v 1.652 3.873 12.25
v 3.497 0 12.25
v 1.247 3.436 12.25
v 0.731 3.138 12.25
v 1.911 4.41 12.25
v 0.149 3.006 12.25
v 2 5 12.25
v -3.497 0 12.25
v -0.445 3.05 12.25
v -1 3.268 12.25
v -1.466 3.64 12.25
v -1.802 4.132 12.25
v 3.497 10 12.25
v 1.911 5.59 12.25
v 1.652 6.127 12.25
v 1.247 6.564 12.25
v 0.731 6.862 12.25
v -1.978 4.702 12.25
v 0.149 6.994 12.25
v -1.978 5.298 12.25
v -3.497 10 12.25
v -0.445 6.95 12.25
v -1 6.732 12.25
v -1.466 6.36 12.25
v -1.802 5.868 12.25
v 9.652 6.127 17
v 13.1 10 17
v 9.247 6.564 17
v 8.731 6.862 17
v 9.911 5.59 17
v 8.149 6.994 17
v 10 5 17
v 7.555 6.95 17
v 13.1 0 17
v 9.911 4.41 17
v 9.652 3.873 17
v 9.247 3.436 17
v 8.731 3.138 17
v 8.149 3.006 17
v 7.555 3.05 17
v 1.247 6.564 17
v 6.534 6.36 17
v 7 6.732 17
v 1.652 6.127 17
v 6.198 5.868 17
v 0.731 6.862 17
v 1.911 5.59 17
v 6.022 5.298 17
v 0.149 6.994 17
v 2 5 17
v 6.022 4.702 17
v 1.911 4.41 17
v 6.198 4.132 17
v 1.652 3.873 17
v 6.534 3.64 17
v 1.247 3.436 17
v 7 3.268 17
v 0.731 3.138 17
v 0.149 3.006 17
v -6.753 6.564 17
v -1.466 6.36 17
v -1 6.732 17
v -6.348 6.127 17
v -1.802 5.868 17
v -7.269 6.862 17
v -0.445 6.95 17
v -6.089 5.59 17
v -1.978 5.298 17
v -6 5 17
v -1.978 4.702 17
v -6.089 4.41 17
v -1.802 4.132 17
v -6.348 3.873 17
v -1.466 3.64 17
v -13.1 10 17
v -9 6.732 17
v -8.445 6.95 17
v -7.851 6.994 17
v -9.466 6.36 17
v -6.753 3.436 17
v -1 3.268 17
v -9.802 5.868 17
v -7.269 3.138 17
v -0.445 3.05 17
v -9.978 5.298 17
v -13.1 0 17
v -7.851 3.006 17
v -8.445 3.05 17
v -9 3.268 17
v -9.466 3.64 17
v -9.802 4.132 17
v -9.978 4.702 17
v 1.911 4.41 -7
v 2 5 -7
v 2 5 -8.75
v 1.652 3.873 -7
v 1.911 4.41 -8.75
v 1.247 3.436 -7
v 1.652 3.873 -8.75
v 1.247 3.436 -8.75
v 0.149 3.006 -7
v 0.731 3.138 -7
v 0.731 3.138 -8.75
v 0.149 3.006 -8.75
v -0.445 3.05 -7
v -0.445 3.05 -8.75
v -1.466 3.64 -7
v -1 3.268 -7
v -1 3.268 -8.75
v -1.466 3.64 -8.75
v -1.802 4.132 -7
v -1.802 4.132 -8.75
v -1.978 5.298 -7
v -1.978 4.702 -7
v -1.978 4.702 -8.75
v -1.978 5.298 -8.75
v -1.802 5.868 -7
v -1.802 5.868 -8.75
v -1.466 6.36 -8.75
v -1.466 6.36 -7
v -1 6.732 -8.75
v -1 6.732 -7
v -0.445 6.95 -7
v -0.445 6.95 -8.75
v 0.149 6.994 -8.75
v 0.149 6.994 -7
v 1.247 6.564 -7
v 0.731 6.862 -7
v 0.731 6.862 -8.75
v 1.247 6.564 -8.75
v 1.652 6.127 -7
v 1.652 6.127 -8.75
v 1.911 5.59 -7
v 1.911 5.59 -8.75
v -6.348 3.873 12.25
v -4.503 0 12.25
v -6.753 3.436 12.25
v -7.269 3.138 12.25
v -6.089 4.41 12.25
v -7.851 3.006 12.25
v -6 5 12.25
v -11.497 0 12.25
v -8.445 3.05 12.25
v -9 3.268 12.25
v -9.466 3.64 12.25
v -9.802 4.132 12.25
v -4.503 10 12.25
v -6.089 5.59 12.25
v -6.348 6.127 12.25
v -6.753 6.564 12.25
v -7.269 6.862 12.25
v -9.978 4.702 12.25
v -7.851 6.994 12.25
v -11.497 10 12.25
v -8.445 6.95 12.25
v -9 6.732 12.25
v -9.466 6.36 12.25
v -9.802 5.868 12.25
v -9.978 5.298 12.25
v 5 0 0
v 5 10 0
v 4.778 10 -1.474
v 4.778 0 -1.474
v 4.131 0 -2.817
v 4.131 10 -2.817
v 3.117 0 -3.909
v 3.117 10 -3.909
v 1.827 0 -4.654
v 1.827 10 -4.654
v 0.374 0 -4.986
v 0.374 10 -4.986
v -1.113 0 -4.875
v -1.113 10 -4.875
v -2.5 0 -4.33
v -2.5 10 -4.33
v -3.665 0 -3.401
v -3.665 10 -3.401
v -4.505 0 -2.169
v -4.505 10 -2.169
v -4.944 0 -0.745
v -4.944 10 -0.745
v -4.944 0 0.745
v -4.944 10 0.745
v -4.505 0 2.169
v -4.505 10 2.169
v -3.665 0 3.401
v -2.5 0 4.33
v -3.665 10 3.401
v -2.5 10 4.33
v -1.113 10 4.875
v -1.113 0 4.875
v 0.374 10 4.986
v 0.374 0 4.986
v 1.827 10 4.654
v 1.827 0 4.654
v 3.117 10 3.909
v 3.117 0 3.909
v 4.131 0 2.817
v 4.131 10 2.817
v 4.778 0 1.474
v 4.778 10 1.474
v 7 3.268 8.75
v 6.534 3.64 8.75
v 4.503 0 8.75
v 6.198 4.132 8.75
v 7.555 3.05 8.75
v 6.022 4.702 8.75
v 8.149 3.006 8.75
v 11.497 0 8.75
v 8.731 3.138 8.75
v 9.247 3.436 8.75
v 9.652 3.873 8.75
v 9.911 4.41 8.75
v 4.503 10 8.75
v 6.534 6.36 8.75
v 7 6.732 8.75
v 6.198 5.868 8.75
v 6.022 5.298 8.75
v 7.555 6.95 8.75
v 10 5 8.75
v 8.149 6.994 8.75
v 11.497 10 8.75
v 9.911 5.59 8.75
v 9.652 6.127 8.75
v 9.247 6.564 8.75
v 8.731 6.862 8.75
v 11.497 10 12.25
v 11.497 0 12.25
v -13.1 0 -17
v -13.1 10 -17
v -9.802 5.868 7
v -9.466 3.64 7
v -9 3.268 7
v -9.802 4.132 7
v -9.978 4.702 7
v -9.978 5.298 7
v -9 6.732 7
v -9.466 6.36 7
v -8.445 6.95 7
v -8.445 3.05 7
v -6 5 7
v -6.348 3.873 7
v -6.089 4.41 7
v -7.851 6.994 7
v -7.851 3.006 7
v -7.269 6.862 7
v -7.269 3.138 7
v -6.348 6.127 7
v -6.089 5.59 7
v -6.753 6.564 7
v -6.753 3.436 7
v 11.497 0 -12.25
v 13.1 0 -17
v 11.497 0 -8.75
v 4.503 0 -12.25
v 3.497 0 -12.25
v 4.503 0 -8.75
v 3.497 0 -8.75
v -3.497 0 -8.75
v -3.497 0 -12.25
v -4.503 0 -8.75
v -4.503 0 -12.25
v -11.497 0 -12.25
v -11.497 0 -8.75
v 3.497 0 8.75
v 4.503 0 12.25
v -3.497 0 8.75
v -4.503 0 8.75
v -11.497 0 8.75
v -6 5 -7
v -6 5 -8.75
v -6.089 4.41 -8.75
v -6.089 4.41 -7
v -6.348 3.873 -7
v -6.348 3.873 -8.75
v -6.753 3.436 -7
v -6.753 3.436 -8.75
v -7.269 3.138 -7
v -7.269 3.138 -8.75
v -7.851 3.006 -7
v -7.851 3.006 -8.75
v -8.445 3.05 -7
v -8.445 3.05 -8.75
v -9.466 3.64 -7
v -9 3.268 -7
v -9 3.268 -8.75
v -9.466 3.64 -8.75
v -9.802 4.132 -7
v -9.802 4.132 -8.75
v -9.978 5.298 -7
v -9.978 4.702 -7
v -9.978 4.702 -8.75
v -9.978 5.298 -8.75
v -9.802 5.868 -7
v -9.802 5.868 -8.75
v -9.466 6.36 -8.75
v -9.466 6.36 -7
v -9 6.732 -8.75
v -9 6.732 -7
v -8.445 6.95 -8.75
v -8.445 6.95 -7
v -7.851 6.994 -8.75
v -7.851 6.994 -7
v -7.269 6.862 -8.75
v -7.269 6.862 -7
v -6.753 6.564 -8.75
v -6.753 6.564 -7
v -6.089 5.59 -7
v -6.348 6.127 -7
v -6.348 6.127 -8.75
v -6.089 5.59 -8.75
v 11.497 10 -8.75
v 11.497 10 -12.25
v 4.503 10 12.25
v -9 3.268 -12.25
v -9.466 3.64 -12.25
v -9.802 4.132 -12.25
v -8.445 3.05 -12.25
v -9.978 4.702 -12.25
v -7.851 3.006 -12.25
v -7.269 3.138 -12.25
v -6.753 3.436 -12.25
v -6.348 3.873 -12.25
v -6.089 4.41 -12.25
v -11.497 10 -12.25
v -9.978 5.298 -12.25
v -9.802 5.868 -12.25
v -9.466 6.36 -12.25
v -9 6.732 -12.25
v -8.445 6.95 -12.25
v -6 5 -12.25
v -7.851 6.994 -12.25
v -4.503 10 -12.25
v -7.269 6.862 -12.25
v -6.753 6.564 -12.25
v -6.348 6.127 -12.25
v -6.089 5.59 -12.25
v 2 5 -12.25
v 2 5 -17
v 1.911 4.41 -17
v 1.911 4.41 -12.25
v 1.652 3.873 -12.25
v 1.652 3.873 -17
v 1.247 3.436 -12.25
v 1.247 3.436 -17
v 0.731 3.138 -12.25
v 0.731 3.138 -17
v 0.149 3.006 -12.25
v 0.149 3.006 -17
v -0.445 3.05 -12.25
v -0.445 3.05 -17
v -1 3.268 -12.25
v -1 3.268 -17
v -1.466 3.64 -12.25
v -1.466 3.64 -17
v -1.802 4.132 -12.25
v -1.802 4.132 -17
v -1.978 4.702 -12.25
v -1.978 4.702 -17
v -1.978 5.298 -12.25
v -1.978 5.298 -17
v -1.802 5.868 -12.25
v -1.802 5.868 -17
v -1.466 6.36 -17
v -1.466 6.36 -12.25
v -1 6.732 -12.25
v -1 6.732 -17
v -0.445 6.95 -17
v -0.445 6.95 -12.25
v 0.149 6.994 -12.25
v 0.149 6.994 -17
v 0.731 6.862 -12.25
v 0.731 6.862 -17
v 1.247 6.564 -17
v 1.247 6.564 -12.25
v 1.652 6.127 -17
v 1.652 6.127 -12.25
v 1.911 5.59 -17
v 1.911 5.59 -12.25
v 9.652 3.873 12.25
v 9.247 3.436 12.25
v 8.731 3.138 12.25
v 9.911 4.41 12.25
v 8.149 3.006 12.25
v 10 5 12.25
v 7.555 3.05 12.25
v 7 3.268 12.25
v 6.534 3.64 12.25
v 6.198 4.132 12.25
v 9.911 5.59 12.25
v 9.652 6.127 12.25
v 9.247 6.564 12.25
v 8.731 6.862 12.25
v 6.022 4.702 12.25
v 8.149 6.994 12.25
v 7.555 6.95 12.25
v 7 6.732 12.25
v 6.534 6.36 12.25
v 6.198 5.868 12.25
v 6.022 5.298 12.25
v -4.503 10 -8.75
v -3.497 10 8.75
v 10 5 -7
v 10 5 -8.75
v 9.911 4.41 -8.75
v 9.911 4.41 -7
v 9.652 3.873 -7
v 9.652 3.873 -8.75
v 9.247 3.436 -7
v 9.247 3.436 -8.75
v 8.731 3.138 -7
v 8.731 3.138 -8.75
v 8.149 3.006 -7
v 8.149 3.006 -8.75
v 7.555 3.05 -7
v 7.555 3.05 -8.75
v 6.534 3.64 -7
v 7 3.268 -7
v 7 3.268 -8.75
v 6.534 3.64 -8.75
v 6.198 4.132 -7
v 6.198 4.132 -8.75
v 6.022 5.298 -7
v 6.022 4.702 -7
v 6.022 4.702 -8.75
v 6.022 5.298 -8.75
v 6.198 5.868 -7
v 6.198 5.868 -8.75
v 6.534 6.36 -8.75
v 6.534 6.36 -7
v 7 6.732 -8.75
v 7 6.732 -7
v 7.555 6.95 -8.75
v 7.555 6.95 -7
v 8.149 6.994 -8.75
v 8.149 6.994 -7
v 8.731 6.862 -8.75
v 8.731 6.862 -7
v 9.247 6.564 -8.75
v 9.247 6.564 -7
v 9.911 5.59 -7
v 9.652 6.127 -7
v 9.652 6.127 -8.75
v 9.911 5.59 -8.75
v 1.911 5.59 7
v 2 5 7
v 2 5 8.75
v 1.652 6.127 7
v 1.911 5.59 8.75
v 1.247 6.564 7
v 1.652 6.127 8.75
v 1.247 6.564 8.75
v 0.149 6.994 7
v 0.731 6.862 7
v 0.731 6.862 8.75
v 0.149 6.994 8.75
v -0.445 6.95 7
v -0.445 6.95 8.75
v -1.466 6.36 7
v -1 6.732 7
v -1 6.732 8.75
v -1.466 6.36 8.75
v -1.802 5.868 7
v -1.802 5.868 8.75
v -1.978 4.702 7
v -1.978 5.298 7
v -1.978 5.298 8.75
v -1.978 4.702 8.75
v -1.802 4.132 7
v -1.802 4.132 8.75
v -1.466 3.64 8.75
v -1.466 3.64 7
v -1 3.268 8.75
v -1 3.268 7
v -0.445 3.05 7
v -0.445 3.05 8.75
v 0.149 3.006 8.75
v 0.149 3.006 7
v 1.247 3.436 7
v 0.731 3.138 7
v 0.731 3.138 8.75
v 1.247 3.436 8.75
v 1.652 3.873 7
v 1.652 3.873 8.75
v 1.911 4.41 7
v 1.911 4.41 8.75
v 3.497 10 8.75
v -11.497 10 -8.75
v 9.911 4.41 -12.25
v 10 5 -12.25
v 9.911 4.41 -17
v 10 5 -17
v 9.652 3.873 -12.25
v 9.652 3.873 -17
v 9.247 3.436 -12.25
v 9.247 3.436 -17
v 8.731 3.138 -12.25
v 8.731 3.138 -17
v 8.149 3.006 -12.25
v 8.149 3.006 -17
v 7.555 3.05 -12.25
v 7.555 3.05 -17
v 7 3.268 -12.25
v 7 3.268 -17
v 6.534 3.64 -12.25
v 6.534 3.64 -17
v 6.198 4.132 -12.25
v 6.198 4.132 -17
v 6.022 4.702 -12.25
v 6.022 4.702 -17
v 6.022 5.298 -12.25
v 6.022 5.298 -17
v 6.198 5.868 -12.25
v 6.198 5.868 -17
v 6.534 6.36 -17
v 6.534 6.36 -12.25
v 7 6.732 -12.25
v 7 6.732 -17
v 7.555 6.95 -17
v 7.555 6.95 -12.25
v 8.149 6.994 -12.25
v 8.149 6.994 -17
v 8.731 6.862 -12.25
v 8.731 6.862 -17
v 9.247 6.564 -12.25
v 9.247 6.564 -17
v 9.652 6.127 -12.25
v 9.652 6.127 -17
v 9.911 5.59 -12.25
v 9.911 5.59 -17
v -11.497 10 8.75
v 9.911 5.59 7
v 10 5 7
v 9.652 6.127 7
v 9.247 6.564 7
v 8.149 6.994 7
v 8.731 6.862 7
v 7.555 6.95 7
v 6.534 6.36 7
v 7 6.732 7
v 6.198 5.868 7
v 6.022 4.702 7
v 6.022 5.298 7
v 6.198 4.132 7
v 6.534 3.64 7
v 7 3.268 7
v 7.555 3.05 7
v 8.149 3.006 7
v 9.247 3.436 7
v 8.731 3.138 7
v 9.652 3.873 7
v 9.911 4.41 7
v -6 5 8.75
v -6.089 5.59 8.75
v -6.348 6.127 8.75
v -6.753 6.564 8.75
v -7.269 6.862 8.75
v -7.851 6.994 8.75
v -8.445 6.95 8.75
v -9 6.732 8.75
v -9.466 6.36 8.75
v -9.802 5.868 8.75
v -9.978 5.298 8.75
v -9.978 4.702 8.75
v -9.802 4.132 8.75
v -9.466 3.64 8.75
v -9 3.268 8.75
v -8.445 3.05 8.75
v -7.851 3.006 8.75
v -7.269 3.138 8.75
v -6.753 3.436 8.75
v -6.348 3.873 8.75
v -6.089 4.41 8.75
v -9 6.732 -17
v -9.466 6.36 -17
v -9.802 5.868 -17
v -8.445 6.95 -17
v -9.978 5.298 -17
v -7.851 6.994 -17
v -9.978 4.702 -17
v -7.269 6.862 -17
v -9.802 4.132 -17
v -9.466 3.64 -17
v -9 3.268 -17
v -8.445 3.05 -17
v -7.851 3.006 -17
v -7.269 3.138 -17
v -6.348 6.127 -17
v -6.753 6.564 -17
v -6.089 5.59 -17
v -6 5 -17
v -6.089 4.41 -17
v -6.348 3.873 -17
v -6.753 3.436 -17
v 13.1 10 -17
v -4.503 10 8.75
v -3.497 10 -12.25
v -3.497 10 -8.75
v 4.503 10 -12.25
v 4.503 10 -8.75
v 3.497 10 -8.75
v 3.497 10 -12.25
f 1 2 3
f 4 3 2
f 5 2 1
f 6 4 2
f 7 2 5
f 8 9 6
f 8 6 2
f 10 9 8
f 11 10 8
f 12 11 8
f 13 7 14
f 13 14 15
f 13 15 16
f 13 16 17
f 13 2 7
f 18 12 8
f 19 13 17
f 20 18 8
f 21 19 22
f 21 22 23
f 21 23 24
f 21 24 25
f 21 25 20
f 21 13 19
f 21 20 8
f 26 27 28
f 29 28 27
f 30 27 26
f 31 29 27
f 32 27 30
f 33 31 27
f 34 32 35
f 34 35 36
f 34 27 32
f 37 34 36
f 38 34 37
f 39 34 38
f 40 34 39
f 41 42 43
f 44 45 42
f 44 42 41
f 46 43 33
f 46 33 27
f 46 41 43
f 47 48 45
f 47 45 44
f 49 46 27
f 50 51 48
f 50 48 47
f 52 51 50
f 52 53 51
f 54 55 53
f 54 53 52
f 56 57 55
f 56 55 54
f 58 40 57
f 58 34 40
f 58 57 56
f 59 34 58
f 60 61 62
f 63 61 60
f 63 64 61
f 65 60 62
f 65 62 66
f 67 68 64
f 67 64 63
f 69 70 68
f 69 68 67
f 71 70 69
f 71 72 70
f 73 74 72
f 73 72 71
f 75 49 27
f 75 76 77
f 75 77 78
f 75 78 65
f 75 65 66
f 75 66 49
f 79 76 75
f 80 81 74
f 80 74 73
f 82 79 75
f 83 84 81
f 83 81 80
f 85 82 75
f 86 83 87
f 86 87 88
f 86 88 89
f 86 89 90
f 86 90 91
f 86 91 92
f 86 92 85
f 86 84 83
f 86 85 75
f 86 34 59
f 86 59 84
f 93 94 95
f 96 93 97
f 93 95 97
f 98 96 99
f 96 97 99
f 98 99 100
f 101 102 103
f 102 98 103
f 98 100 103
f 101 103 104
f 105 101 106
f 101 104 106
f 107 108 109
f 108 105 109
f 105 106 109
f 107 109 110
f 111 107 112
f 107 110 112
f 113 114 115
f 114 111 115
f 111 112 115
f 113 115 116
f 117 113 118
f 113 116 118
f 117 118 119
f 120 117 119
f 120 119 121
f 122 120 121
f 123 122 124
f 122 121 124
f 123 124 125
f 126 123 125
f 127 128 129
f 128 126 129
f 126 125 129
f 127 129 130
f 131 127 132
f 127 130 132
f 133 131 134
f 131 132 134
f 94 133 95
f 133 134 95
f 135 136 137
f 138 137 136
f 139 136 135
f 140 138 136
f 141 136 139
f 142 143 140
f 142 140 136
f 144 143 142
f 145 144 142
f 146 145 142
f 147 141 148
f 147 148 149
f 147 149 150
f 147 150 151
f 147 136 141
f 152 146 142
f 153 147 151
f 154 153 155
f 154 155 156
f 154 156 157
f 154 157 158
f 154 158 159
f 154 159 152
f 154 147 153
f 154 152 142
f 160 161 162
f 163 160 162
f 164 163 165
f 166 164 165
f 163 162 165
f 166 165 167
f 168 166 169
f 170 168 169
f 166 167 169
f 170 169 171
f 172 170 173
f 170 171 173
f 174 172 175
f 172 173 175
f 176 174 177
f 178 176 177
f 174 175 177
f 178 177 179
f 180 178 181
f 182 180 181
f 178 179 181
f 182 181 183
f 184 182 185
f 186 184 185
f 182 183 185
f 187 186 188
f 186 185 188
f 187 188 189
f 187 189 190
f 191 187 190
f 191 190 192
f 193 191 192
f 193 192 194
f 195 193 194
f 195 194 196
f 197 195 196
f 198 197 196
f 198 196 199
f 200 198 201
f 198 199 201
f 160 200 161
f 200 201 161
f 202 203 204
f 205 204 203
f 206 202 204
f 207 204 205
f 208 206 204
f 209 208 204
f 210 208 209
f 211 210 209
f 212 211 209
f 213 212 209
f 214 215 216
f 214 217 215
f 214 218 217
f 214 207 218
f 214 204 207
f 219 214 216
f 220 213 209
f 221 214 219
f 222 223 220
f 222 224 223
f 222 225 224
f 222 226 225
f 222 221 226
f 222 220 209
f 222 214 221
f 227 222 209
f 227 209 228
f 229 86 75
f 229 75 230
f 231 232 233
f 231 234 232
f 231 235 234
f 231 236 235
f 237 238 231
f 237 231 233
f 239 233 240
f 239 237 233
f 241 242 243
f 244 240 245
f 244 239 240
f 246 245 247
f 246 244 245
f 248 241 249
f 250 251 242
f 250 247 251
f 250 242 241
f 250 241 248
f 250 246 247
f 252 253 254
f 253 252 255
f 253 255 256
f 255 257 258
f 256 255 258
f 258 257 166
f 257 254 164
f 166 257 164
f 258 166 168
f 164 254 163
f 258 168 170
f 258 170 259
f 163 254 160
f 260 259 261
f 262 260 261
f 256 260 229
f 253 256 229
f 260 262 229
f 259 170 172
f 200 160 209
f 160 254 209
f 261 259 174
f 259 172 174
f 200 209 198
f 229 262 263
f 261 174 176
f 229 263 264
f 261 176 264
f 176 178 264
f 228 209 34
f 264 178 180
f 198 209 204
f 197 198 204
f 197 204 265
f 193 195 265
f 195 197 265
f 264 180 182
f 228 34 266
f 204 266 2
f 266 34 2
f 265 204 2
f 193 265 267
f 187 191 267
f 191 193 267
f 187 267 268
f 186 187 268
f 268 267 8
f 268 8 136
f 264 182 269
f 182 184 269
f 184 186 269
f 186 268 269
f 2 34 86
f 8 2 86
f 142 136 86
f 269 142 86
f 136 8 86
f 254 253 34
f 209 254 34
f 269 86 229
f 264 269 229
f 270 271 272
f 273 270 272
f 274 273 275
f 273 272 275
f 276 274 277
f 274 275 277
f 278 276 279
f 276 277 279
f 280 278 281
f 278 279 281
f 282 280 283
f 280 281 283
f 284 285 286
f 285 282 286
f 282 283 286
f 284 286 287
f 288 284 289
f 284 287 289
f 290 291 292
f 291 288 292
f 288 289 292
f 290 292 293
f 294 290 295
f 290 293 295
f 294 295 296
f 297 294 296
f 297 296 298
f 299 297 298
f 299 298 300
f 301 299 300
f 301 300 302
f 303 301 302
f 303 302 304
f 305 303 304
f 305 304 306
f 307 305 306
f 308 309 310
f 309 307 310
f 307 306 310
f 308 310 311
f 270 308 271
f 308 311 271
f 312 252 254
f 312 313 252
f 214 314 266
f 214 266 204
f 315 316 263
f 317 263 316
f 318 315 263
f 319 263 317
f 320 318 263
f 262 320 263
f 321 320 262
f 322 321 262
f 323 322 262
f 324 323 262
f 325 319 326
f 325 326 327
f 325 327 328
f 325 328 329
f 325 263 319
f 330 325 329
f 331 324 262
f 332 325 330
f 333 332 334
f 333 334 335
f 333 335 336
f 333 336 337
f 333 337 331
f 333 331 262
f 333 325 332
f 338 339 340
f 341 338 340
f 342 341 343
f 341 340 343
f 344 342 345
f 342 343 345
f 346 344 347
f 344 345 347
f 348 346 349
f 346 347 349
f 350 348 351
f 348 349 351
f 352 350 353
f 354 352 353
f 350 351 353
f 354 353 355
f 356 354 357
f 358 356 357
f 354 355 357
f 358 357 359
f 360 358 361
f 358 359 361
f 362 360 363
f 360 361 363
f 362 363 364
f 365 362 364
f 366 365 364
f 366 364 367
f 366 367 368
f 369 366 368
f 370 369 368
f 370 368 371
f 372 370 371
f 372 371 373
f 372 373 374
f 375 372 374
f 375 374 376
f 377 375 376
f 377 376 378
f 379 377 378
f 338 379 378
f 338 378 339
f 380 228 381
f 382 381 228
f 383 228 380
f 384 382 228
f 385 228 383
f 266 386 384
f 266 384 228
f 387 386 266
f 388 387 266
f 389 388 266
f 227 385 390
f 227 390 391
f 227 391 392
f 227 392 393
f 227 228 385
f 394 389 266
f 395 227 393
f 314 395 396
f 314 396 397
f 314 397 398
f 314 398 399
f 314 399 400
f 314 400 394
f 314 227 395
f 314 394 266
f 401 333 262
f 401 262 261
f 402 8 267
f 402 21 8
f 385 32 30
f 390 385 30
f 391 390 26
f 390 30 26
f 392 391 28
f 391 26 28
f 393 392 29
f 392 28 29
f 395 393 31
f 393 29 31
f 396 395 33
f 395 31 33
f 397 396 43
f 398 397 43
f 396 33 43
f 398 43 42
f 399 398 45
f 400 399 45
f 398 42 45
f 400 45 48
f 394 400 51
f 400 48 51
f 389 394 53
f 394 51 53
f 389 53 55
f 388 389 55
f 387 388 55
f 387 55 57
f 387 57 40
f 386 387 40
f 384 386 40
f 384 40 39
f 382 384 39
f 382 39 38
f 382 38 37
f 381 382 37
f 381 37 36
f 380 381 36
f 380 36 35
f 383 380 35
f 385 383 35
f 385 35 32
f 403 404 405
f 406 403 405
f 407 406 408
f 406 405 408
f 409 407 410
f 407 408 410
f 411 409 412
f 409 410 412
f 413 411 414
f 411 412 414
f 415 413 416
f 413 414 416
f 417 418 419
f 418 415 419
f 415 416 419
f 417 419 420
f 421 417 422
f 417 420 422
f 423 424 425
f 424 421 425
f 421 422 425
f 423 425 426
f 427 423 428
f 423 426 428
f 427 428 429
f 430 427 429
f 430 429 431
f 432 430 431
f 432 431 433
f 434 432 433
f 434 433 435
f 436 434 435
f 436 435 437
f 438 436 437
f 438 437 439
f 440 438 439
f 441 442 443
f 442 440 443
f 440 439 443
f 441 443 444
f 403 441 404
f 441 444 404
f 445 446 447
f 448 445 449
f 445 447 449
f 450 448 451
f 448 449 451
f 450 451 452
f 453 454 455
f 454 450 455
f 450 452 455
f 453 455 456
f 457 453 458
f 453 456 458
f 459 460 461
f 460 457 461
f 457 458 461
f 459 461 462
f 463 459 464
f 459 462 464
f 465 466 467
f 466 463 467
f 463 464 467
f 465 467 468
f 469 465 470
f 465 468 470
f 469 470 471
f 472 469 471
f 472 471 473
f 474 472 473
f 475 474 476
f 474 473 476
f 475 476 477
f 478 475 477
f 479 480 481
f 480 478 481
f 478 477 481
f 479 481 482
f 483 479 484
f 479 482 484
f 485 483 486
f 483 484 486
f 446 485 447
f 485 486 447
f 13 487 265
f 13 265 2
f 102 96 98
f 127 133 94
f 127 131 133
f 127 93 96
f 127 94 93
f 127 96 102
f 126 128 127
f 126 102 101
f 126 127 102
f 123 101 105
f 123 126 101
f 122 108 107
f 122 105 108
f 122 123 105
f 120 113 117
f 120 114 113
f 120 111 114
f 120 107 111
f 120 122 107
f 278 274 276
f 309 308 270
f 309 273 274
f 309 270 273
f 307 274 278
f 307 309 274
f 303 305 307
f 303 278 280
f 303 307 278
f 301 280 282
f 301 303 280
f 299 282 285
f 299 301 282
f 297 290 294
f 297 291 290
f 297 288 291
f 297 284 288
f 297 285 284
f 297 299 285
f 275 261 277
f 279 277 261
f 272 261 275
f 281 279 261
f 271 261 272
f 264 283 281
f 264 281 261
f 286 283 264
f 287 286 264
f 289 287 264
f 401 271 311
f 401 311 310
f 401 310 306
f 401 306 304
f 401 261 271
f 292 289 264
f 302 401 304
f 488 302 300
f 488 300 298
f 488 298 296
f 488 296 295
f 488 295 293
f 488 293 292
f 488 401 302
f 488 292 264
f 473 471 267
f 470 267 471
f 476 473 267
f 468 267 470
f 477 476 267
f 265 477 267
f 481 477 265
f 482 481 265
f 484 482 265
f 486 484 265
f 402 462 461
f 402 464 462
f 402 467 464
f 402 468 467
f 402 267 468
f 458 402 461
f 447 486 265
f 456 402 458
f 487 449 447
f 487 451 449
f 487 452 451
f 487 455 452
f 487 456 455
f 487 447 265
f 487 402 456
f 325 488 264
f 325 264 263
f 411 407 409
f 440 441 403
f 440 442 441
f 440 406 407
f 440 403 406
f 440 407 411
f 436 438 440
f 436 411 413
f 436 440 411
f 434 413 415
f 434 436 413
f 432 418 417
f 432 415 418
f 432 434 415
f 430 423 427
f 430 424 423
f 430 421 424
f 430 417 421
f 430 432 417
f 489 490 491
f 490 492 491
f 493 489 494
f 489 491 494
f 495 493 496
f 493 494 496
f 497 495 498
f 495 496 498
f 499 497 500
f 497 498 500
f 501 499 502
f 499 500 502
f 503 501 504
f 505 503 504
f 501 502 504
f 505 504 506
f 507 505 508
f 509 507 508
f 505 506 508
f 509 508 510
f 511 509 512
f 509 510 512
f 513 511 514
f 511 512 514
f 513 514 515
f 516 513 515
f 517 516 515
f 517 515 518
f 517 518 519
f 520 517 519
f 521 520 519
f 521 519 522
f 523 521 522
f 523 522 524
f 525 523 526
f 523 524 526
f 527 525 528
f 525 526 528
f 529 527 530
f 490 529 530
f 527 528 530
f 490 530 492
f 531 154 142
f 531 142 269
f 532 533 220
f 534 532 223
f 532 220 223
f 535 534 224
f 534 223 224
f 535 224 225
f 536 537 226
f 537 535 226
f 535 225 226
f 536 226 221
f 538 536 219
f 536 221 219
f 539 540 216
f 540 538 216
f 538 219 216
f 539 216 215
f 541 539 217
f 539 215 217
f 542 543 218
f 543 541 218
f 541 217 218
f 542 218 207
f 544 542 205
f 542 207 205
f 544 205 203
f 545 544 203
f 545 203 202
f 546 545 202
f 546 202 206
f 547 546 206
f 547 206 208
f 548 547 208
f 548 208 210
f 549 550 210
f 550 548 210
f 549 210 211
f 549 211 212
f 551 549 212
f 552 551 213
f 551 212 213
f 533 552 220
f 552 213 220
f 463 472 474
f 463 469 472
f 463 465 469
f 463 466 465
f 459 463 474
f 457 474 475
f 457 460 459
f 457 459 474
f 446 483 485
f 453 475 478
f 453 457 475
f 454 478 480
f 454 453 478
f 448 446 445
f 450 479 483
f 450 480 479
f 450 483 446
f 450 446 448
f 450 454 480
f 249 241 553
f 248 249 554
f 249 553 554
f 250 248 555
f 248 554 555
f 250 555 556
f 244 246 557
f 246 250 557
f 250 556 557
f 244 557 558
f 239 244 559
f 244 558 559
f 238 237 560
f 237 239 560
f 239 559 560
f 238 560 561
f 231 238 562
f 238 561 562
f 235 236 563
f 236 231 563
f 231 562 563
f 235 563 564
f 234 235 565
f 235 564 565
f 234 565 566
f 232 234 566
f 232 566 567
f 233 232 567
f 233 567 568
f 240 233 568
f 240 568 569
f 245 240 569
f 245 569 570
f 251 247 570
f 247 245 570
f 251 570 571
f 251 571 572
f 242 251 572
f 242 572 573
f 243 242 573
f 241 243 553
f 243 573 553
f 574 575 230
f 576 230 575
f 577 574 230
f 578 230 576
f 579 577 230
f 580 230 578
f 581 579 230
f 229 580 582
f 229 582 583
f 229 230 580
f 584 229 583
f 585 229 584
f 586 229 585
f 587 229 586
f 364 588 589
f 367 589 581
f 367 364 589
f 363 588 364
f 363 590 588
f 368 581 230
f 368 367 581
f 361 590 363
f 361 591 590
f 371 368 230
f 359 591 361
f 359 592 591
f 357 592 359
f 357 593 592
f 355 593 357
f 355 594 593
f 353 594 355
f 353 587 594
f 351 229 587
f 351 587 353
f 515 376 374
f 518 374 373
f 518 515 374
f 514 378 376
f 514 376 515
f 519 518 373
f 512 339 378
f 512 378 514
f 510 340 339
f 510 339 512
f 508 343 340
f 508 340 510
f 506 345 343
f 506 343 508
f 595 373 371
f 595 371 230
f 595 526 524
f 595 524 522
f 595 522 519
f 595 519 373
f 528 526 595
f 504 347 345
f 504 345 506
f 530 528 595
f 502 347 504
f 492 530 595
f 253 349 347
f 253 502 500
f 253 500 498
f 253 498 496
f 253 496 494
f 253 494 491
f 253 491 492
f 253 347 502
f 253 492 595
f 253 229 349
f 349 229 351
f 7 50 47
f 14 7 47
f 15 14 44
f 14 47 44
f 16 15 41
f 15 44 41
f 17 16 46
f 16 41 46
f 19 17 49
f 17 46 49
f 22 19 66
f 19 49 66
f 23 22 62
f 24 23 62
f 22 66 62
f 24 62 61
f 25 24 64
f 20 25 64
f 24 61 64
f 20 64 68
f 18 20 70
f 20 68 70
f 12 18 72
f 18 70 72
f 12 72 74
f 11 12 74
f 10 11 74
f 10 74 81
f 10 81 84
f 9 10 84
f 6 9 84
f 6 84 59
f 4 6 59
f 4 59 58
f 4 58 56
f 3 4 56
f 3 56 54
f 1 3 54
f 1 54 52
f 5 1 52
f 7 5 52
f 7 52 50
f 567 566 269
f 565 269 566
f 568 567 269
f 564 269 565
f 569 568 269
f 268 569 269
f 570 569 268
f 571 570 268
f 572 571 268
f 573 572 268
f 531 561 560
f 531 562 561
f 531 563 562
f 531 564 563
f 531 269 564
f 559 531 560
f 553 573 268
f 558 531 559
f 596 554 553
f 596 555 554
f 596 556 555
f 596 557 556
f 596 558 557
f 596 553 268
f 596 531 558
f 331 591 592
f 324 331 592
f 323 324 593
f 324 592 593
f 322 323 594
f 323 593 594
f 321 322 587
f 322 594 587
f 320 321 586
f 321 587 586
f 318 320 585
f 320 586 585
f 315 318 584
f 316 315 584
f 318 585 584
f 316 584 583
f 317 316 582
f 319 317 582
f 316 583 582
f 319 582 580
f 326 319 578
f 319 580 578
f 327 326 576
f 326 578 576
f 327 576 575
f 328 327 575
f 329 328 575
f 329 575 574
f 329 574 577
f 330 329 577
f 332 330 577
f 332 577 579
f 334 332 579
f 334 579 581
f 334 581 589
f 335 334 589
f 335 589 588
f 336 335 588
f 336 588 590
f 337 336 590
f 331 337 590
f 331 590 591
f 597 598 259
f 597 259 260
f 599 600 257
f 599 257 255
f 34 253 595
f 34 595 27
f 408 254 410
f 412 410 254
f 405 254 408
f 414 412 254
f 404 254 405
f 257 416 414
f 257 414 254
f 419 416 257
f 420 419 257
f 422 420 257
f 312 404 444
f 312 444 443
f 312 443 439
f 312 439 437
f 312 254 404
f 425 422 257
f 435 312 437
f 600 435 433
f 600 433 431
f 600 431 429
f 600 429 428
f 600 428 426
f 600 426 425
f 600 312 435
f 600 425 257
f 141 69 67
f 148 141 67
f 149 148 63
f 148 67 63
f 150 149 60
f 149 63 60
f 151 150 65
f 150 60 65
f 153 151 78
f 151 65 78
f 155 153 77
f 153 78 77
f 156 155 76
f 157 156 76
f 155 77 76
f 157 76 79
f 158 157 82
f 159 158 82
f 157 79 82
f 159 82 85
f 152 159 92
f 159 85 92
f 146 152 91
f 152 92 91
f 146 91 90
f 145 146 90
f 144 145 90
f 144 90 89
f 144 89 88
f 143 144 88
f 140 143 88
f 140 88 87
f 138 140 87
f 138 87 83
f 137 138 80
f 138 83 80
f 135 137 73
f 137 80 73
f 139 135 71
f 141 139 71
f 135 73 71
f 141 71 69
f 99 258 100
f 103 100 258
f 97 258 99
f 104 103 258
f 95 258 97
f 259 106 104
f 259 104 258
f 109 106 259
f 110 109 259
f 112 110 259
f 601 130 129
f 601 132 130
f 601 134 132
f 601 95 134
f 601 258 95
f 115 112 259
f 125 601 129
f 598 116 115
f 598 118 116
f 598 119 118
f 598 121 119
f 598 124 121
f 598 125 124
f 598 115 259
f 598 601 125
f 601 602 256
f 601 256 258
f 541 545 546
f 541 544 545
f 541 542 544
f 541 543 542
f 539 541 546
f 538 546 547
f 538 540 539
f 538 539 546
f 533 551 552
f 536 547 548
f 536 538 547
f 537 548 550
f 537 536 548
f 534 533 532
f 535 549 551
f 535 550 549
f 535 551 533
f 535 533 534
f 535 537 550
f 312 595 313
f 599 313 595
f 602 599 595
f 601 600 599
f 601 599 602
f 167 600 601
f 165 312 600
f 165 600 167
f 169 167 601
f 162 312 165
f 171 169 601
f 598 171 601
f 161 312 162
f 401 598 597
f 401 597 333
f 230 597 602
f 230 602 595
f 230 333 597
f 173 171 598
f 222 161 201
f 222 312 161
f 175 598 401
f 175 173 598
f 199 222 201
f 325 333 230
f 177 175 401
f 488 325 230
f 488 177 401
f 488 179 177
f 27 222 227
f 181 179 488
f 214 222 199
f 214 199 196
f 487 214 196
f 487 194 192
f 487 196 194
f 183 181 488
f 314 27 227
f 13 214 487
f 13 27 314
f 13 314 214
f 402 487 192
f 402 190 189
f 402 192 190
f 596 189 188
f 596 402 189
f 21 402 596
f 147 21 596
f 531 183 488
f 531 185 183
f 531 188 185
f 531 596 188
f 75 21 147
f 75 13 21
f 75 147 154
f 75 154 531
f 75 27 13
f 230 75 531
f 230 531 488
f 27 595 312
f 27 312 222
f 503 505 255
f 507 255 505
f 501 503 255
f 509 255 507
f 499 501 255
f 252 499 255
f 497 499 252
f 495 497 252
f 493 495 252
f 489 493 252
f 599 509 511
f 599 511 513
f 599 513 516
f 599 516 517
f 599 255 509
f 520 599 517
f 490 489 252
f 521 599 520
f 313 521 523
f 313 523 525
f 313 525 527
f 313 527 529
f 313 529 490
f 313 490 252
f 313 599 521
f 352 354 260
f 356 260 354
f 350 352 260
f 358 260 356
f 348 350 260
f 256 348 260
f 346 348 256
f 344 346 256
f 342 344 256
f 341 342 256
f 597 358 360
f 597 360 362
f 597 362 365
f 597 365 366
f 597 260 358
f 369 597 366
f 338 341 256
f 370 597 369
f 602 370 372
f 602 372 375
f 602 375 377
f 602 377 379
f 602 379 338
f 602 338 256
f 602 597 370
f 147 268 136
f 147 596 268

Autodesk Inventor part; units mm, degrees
ref_plane "YZ Plane" through (0, 0, 0) normal (1, 0, 0) x (0, 1, 0)
ref_plane "XZ Plane" through (0, 0, 0) normal (0, 1, 0) x (-1, 0, 0)
ref_plane "XY Plane" through (0, 0, 0) normal (0, 0, 1) x (1, 0, 0)
sketch "Эскиз1" plane through (0, 0, 0) normal (0, 1, 0) x (-1, 0, 0)
  line L0 (-13.1, 17) -> (13.1, 17)
  line L1 (13.1, 17) -> (13.1, -17)
  line L2 (13.1, -17) -> (-13.1, -17)
  line L3 (-13.1, -17) -> (-13.1, 17)
  line L4 (-13.1, 17) -> (13.1, -17) construction
  line L5 (13.1, 17) -> (-13.1, -17) construction
  point P0 (0, 0)
  dimension "d0" = 26.2
  dimension "d1" = 34
extrude "Выдавливание1" add sketch "Эскиз1" along normal blind 10
sketch "Эскиз2" plane through (-13.1, 0, 17) normal (0, 0, 1) x (1, 0, 0)
  line L0 (0, 10) -> (26.2, 10) projected
  line L1 (13.1, 10) -> (13.1, 5)
  circle A0 centre (13.1, 5) radius 2
  point P0 (13.1, 0)
  dimension "d4" = 5
  dimension "d5" = 4
extrude "Выдавливание2" cut sketch "Эскиз2" against normal blind 10
sketch "Эскиз4" plane through (0, 10, 0) normal (0, 1, 0) x (1, 0, 0)
  line L0 (2, -7) -> (-2, -7) projected
  line L1 (3.4971, -12.25) -> (-3.4971, -12.25)
  line L2 (-3.4971, -12.25) -> (-3.4971, -8.75)
  line L3 (-3.4971, -8.75) -> (3.4971, -8.75)
  line L4 (3.4971, -8.75) -> (3.4971, -12.25)
  line L5 (3.4971, -12.25) -> (-3.4971, -8.75) construction
  line L6 (-3.4971, -12.25) -> (3.4971, -8.75) construction
  point P0 (0, 0)
  point P1 (0, -10.5)
  dimension "d20" = 10.5
extrude "Выдавливание3" cut sketch "Эскиз4" against normal through all
pattern_linear "Прямоуг.массив2" count 3 spacing 8 along (1, 0, 0) of "Выдавливание2", "Выдавливание3" first direction both ways yes
mirror "Зеркальное отражение2" about plane through (0, 0, 0) normal (0, 0, 1) of "Выдавливание2", "Выдавливание3", "Прямоуг.массив2"
sketch "Эскиз5" plane through (0, 10, 0) normal (0, 1, 0) x (1, 0, 0)
  circle A0 centre (0, 0) radius 5
  dimension "d17" = 10
extrude "Выдавливание4" cut sketch "Эскиз5" against normal blind 10
sketch "Эскиз6" plane through (0, 10, 0) normal (0, 1, 0) x (1, 0, 0)
  circle A0 centre (0, 0) radius 5 projected
  line L0 (4.5029, 8.75) -> (4.5029, 12.25) projected
  line L1 (4.5029, 12.25) -> (11.4971, 12.25) projected
  line L2 (11.4971, 12.25) -> (11.4971, 8.75) projected
  line L3 (-11.4971, 8.75) -> (-11.4971, 12.25) projected
  line L4 (-11.4971, 12.25) -> (-4.5029, 12.25) projected
  line L5 (-4.5029, 12.25) -> (-4.5029, 8.75) projected
  line L6 (-3.4971, 8.75) -> (-3.4971, 12.25) projected
  line L7 (-3.4971, 12.25) -> (3.4971, 12.25) projected
  line L8 (3.4971, 12.25) -> (3.4971, 8.75) projected
  line L9 (4.5029, -12.25) -> (4.5029, -8.75) projected
  line L10 (11.4971, -8.75) -> (11.4971, -12.25) projected
  line L11 (11.4971, -12.25) -> (4.5029, -12.25) projected
  line L12 (-11.4971, -12.25) -> (-11.4971, -8.75) projected
  line L13 (-4.5029, -8.75) -> (-4.5029, -12.25) projected
  line L14 (-4.5029, -12.25) -> (-11.4971, -12.25) projected
  line L15 (3.4971, -8.75) -> (3.4971, -12.25) projected
  line L16 (3.4971, -12.25) -> (-3.4971, -12.25) projected
  line L17 (-3.4971, -12.25) -> (-3.4971, -8.75) projected
  line L18 (-13.1, -17) -> (13.1, -17) projected
  line L19 (13.1, -17) -> (13.1, 17) projected
  line L20 (13.1, 17) -> (-13.1, 17) projected
  line L21 (-13.1, 17) -> (-13.1, -17) projected
  line L22 (11.4971, 8.75) -> (4.5029, 8.75) projected
  line L23 (-4.5029, 8.75) -> (-11.4971, 8.75) projected
  line L24 (3.4971, 8.75) -> (-3.4971, 8.75) projected
  line L25 (4.5029, -8.75) -> (11.4971, -8.75) projected
  line L26 (-11.4971, -8.75) -> (-4.5029, -8.75) projected
  line L27 (-3.4971, -8.75) -> (3.4971, -8.75) projected
properties part number "000.406 - Проставка" material "Пластик АБС"
